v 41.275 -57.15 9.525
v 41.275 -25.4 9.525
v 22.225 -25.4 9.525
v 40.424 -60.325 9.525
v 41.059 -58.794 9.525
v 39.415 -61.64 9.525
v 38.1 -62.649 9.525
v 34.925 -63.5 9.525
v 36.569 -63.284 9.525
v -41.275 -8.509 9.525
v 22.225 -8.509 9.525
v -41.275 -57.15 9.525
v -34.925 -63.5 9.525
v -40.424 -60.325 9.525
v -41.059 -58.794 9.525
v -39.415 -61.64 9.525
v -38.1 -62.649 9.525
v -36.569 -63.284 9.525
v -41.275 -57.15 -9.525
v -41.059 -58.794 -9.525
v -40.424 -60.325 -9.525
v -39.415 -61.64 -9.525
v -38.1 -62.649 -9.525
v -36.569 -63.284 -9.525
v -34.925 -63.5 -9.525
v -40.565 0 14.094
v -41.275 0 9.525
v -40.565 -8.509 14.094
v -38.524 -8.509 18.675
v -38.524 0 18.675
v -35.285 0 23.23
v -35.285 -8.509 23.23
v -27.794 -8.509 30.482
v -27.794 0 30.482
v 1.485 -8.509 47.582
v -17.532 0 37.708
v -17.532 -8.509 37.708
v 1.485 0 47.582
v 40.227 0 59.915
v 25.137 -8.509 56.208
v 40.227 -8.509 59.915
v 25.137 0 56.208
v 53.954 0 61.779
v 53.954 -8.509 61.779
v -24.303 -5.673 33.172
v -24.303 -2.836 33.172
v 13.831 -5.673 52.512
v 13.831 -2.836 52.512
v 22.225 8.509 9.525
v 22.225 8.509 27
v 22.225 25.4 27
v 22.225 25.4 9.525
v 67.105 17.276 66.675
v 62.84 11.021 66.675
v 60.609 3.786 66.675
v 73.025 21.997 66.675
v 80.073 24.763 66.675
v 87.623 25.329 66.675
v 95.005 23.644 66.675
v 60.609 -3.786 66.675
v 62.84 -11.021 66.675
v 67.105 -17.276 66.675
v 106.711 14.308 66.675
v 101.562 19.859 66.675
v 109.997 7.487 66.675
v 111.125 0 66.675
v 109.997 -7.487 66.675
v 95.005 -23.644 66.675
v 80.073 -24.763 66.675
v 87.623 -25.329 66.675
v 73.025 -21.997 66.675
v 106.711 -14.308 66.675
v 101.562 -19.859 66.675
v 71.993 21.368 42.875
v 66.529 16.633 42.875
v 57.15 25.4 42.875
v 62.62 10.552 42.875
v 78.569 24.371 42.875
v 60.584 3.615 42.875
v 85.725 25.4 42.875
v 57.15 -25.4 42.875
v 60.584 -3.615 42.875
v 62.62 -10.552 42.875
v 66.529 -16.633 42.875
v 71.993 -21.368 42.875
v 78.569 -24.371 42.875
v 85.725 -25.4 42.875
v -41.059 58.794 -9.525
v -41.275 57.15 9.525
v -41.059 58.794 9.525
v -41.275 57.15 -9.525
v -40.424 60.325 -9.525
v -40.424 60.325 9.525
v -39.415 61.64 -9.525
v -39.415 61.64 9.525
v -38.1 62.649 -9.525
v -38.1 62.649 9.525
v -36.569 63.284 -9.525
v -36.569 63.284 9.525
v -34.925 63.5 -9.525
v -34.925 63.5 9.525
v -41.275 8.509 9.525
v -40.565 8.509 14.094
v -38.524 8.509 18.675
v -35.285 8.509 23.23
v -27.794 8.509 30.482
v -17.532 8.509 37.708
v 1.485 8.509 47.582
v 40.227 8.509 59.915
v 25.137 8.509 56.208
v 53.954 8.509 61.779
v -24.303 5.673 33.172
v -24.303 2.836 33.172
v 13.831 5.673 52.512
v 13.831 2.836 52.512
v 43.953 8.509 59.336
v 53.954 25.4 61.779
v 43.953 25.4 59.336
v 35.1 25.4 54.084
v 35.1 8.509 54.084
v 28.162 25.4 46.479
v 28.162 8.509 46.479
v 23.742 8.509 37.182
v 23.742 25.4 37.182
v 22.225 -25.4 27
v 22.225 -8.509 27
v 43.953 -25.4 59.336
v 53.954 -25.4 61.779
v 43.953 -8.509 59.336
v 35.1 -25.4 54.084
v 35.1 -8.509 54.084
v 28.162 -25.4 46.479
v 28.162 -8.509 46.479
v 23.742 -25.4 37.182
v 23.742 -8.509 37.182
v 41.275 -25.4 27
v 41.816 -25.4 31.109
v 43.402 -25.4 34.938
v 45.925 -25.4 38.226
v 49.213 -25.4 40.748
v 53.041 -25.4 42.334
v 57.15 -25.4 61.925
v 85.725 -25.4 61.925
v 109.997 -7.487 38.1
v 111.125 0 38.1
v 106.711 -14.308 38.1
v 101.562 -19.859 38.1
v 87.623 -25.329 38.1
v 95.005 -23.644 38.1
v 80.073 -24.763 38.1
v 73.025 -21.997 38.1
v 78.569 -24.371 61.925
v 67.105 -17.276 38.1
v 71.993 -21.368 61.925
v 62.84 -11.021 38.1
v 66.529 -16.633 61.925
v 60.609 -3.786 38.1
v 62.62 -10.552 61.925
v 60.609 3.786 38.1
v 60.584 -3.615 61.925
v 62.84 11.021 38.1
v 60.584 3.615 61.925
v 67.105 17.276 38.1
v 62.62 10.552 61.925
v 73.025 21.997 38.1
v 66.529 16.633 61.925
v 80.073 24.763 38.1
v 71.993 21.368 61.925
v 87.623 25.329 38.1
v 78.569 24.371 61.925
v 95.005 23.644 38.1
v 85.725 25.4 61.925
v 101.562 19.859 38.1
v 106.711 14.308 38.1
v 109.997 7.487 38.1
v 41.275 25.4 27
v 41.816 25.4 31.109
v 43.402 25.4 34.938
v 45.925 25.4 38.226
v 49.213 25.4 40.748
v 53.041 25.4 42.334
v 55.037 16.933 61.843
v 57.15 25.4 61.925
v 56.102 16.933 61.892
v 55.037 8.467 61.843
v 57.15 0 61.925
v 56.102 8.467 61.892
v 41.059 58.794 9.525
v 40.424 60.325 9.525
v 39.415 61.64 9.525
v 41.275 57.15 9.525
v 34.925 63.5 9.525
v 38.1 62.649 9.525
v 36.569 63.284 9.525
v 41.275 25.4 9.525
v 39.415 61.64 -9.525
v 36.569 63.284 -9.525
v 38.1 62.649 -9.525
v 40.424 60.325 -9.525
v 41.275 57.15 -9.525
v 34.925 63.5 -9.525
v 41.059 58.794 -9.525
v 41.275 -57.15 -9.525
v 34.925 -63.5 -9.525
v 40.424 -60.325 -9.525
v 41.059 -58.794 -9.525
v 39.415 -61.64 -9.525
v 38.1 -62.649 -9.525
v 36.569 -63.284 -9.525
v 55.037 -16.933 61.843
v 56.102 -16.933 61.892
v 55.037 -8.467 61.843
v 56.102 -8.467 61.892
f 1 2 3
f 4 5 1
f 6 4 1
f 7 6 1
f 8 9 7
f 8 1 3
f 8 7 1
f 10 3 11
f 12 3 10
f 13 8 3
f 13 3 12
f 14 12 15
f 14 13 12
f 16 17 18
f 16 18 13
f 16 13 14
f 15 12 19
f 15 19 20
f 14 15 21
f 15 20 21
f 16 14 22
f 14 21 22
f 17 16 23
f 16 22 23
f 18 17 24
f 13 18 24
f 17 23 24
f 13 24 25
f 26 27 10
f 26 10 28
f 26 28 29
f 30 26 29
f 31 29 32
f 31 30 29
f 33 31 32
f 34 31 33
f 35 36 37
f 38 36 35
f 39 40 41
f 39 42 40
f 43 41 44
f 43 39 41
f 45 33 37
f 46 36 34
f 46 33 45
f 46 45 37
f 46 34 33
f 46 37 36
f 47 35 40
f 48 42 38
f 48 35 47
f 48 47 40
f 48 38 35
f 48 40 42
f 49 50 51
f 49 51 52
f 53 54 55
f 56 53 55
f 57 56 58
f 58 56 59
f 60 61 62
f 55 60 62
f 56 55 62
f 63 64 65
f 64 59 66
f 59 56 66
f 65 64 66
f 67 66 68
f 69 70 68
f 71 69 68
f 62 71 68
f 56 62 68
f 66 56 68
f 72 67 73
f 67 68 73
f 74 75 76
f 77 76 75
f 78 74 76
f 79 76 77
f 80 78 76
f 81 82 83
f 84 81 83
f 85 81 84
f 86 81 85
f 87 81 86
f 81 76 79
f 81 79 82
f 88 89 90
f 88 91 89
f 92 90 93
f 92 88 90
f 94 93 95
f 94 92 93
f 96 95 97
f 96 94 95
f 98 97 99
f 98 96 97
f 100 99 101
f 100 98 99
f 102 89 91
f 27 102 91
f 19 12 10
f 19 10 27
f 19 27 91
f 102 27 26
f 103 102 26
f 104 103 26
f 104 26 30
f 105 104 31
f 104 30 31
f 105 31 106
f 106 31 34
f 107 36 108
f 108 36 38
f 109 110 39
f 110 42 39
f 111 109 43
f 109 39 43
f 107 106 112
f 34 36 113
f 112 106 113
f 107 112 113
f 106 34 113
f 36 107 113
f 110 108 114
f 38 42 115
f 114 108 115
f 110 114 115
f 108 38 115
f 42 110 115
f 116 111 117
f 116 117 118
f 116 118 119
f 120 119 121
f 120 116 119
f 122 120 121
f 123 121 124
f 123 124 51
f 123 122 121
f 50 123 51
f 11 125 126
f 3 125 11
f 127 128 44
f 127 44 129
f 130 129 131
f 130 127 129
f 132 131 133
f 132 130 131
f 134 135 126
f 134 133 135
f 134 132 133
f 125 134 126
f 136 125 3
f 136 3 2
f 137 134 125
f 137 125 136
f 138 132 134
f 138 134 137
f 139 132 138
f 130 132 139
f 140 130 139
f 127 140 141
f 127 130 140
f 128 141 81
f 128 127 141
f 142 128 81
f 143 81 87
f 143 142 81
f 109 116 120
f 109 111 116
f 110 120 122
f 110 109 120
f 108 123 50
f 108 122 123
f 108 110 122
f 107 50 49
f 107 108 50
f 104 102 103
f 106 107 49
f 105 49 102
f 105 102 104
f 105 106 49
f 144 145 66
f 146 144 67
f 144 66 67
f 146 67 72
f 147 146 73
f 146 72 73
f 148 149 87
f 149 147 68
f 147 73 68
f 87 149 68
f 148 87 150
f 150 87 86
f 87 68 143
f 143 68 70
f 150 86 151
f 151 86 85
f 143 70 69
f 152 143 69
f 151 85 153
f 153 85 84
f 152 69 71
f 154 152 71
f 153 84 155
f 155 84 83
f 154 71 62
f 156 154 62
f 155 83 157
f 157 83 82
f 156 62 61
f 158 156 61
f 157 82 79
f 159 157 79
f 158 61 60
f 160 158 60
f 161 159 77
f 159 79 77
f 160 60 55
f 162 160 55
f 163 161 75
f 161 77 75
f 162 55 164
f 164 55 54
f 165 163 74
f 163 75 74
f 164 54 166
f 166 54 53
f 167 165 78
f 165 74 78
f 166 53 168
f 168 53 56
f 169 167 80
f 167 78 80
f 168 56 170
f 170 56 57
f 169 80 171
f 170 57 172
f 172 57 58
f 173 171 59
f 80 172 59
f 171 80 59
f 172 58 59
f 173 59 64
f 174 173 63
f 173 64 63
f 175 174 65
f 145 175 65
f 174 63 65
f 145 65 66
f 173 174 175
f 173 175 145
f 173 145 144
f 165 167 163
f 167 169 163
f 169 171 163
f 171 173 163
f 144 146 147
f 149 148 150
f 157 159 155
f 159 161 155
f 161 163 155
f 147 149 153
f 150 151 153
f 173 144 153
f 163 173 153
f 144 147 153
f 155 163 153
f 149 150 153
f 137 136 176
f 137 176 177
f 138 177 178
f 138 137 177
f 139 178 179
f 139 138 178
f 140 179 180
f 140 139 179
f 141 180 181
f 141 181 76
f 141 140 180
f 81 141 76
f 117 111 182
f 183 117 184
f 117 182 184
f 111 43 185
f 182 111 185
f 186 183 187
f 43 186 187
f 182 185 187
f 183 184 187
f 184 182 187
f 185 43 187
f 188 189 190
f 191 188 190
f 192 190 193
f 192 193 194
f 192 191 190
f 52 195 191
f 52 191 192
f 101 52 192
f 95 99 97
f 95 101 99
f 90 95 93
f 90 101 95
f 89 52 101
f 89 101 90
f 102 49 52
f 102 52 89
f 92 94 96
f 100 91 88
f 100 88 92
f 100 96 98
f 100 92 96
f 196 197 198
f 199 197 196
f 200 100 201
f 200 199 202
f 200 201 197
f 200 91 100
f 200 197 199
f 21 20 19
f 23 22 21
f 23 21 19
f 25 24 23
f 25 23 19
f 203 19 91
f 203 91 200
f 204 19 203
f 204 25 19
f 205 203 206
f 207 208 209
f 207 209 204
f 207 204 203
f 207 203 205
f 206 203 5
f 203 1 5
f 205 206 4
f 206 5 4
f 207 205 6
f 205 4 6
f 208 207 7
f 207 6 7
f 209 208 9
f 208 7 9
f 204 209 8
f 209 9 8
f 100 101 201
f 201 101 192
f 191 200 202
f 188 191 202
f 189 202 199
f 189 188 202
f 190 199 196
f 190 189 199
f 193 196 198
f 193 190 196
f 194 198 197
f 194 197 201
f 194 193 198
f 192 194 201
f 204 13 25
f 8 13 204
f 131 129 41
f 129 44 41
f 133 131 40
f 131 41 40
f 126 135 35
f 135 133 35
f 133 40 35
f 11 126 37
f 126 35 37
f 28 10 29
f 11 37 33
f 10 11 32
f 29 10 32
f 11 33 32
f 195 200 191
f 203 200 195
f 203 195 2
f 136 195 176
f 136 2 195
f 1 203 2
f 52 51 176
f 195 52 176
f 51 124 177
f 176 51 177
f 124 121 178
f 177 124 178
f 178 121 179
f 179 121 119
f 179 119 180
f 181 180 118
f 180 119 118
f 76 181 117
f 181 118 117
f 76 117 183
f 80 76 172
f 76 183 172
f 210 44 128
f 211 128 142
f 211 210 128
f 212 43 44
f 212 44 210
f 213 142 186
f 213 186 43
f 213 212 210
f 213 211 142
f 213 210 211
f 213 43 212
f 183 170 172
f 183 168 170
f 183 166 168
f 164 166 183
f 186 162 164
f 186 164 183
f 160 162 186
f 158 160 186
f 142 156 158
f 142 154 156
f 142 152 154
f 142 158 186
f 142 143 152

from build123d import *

# Parameters (mm, degrees)
F1_DEPTH = 63.5
F2_DEPTH = 25.4
F3_DEPTH = 8.509
F4_DEPTH = 25.4
F6_R     = 6.35


with BuildPart() as f1:
    # F0 (on Front) → F1 (new body, symmetric)
    with BuildSketch(Plane.XZ):
        Polygon((22.225, 9.525), (-41.275, 9.525), (-41.275, -9.525), (41.275, -9.525), (41.275, 9.525), align=None)
    extrude(amount=F1_DEPTH, both=True)

    # F0 (on Front) → F2 (join, symmetric)
    with BuildSketch(Plane.XZ):
        with BuildLine():
            Line((22.225, 27.0002), (22.225, 9.525))
            Line((22.225, 9.525), (41.275, 9.525))
            Line((41.275, 9.525), (41.275, 27.0002))
            ThreePointArc((41.275, 27.0002), (45.92468, 38.22552), (57.15, 42.8752))
            Line((57.15, 42.8752), (60.325, 42.8752))
            Line((60.325, 42.8752), (60.325, 61.9252))
            Line((60.325, 61.9252), (57.15, 61.9252))
            add(Edge.make_bspline(
                [(53.953536, 61.778616), (55.045402, 61.851231), (56.111784, 61.900361), (57.15, 61.9252)],
                knots=[108.105428, 108.105428, 108.105428, 108.105428, 111.504536, 111.504536, 111.504536, 111.504536], degree=3))
            ThreePointArc((53.953536, 61.778616), (31.348913, 50.53867), (22.225, 27.0002))
        make_face()
    extrude(amount=F2_DEPTH, both=True)

    # F0 (on Front) → F3 (join, symmetric)
    with BuildSketch(Plane.XZ):
        with BuildLine():
            add(Edge.make_bspline(
                [(-41.275, 9.525), (-41.275, 33.404525), (19.227765, 59.46916), (53.953536, 61.778616)],
                knots=[0, 0, 0, 0, 108.105428, 108.105428, 108.105428, 108.105428], degree=3))
            Line((-41.275, 9.525), (22.225, 9.525))
            Line((22.225, 9.525), (22.225, 27.0002))
            ThreePointArc((22.225, 27.0002), (31.348913, 50.53867), (53.953536, 61.778616))
        make_face()
    extrude(amount=F3_DEPTH, both=True)

    # F0 (on Front) → F4 (join, symmetric)
    with BuildSketch(Plane.XZ):
        Polygon((76.154022, 61.9252), (60.325, 61.9252), (60.325, 42.8752), (76.154022, 42.8752), (85.725, 42.8752), (85.725, 61.9252), align=None)
    extrude(amount=F4_DEPTH, both=True)

    # F0 (on Front) → F5 (revolve)
    with BuildSketch(Plane.XZ):
        Polygon((111.125, 66.675), (85.725, 66.675), (85.725, 61.9252), (85.725, 42.8752), (85.725, 38.1), (111.125, 38.1), align=None)
    revolve(axis=Axis((85.725, 0, 52.3875), (0, 0, -1)))

    # F6
    f6_edges = [f1.edges().sort_by_distance(p)[0] for p in [
        (-41.275, 63.5, 0),
        (41.275, 63.5, 0),
        (-41.275, -63.5, 0),
        (41.275, -63.5, 0),
    ]]
    fillet(f6_edges, radius=F6_R)


solid = f1.part
